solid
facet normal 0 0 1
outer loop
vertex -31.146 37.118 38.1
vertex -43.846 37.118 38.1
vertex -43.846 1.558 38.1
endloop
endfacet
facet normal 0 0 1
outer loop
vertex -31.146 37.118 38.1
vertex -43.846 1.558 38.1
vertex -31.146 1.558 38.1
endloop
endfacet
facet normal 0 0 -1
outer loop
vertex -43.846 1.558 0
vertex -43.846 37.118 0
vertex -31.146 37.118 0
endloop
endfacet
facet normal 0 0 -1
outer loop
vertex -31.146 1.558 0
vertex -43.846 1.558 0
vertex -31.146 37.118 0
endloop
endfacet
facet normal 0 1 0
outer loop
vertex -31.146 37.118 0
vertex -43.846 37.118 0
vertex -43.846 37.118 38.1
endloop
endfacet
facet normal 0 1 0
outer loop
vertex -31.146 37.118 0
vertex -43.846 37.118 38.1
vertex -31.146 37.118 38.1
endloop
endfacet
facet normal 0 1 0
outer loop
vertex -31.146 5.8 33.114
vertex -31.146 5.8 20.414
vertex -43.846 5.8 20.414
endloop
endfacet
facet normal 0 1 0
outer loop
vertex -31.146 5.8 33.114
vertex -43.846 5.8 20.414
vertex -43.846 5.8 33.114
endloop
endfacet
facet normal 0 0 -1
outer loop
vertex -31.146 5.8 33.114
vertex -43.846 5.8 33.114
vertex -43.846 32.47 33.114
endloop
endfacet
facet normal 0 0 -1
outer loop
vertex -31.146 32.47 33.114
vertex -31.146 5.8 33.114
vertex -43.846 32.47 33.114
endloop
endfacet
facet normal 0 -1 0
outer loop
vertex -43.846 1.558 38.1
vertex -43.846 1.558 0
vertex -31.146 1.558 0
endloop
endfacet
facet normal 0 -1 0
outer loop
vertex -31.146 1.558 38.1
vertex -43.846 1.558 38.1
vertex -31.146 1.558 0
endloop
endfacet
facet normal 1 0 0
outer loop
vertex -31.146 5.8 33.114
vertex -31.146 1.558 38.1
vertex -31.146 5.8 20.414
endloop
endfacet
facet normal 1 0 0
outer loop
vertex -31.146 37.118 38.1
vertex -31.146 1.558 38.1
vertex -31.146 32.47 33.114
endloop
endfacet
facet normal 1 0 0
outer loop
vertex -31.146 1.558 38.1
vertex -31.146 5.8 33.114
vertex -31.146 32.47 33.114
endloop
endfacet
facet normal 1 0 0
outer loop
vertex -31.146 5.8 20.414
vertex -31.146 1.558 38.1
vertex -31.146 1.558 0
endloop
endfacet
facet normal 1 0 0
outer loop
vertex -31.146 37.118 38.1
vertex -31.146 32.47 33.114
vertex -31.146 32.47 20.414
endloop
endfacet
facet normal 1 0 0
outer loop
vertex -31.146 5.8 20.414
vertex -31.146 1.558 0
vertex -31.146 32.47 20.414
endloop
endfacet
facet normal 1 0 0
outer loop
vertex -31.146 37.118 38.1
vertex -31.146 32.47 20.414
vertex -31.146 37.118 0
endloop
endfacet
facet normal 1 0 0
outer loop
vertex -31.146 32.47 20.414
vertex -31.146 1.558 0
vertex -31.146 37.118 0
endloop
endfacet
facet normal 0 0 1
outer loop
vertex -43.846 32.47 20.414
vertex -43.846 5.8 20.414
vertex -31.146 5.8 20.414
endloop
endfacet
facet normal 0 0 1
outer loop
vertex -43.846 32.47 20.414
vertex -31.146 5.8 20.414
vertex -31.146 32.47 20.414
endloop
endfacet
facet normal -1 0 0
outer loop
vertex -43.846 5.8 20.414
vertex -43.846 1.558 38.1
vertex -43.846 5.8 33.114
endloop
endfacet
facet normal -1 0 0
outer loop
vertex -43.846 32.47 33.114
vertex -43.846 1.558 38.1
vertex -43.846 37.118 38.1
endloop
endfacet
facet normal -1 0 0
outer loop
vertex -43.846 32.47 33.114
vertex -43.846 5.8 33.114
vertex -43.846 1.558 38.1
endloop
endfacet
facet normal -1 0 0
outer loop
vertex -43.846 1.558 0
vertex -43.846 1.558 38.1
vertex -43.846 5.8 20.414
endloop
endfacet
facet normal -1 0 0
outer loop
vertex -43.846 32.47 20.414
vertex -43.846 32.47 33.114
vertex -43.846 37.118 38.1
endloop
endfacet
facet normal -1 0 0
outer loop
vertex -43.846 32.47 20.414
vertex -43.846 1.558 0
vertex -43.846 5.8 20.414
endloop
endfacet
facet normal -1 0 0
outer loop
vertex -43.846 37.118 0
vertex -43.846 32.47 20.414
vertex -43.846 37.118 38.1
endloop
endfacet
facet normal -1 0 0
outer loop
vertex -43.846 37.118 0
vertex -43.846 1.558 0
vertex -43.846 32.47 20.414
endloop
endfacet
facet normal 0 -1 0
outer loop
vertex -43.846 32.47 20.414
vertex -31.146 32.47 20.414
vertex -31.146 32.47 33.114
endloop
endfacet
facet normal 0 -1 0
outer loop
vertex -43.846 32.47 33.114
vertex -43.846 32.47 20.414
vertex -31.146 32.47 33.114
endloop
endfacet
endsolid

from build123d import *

# Parameters (mm, degrees)
CROQUIS1_W              = 12.7
CROQUIS1_H              = 35.56
SALIENTE_EXTRUIR1_DEPTH = 38.1
CROQUIS3_W              = 12.7
CROQUIS3_H              = 26.67
CORTAR_EXTRUIR1_DEPTH   = 38.1


with BuildPart() as part:
    # Croquis1 → Saliente-Extruir1 (new body)
    with BuildSketch(Plane.XY):
        with Locations((-37.495945778, 19.33754717)):
            Rectangle(CROQUIS1_W, CROQUIS1_H)
    extrude(amount=SALIENTE_EXTRUIR1_DEPTH)

    # Croquis3 → Cortar-Extruir1 (cut)
    with BuildSketch(Plane.ZY.offset(43.845945778)):
        with Locations((26.763723238, 19.135311011)):
            Rectangle(CROQUIS3_W, CROQUIS3_H)
    extrude(amount=-CORTAR_EXTRUIR1_DEPTH, mode=Mode.SUBTRACT)


solid = part.part
